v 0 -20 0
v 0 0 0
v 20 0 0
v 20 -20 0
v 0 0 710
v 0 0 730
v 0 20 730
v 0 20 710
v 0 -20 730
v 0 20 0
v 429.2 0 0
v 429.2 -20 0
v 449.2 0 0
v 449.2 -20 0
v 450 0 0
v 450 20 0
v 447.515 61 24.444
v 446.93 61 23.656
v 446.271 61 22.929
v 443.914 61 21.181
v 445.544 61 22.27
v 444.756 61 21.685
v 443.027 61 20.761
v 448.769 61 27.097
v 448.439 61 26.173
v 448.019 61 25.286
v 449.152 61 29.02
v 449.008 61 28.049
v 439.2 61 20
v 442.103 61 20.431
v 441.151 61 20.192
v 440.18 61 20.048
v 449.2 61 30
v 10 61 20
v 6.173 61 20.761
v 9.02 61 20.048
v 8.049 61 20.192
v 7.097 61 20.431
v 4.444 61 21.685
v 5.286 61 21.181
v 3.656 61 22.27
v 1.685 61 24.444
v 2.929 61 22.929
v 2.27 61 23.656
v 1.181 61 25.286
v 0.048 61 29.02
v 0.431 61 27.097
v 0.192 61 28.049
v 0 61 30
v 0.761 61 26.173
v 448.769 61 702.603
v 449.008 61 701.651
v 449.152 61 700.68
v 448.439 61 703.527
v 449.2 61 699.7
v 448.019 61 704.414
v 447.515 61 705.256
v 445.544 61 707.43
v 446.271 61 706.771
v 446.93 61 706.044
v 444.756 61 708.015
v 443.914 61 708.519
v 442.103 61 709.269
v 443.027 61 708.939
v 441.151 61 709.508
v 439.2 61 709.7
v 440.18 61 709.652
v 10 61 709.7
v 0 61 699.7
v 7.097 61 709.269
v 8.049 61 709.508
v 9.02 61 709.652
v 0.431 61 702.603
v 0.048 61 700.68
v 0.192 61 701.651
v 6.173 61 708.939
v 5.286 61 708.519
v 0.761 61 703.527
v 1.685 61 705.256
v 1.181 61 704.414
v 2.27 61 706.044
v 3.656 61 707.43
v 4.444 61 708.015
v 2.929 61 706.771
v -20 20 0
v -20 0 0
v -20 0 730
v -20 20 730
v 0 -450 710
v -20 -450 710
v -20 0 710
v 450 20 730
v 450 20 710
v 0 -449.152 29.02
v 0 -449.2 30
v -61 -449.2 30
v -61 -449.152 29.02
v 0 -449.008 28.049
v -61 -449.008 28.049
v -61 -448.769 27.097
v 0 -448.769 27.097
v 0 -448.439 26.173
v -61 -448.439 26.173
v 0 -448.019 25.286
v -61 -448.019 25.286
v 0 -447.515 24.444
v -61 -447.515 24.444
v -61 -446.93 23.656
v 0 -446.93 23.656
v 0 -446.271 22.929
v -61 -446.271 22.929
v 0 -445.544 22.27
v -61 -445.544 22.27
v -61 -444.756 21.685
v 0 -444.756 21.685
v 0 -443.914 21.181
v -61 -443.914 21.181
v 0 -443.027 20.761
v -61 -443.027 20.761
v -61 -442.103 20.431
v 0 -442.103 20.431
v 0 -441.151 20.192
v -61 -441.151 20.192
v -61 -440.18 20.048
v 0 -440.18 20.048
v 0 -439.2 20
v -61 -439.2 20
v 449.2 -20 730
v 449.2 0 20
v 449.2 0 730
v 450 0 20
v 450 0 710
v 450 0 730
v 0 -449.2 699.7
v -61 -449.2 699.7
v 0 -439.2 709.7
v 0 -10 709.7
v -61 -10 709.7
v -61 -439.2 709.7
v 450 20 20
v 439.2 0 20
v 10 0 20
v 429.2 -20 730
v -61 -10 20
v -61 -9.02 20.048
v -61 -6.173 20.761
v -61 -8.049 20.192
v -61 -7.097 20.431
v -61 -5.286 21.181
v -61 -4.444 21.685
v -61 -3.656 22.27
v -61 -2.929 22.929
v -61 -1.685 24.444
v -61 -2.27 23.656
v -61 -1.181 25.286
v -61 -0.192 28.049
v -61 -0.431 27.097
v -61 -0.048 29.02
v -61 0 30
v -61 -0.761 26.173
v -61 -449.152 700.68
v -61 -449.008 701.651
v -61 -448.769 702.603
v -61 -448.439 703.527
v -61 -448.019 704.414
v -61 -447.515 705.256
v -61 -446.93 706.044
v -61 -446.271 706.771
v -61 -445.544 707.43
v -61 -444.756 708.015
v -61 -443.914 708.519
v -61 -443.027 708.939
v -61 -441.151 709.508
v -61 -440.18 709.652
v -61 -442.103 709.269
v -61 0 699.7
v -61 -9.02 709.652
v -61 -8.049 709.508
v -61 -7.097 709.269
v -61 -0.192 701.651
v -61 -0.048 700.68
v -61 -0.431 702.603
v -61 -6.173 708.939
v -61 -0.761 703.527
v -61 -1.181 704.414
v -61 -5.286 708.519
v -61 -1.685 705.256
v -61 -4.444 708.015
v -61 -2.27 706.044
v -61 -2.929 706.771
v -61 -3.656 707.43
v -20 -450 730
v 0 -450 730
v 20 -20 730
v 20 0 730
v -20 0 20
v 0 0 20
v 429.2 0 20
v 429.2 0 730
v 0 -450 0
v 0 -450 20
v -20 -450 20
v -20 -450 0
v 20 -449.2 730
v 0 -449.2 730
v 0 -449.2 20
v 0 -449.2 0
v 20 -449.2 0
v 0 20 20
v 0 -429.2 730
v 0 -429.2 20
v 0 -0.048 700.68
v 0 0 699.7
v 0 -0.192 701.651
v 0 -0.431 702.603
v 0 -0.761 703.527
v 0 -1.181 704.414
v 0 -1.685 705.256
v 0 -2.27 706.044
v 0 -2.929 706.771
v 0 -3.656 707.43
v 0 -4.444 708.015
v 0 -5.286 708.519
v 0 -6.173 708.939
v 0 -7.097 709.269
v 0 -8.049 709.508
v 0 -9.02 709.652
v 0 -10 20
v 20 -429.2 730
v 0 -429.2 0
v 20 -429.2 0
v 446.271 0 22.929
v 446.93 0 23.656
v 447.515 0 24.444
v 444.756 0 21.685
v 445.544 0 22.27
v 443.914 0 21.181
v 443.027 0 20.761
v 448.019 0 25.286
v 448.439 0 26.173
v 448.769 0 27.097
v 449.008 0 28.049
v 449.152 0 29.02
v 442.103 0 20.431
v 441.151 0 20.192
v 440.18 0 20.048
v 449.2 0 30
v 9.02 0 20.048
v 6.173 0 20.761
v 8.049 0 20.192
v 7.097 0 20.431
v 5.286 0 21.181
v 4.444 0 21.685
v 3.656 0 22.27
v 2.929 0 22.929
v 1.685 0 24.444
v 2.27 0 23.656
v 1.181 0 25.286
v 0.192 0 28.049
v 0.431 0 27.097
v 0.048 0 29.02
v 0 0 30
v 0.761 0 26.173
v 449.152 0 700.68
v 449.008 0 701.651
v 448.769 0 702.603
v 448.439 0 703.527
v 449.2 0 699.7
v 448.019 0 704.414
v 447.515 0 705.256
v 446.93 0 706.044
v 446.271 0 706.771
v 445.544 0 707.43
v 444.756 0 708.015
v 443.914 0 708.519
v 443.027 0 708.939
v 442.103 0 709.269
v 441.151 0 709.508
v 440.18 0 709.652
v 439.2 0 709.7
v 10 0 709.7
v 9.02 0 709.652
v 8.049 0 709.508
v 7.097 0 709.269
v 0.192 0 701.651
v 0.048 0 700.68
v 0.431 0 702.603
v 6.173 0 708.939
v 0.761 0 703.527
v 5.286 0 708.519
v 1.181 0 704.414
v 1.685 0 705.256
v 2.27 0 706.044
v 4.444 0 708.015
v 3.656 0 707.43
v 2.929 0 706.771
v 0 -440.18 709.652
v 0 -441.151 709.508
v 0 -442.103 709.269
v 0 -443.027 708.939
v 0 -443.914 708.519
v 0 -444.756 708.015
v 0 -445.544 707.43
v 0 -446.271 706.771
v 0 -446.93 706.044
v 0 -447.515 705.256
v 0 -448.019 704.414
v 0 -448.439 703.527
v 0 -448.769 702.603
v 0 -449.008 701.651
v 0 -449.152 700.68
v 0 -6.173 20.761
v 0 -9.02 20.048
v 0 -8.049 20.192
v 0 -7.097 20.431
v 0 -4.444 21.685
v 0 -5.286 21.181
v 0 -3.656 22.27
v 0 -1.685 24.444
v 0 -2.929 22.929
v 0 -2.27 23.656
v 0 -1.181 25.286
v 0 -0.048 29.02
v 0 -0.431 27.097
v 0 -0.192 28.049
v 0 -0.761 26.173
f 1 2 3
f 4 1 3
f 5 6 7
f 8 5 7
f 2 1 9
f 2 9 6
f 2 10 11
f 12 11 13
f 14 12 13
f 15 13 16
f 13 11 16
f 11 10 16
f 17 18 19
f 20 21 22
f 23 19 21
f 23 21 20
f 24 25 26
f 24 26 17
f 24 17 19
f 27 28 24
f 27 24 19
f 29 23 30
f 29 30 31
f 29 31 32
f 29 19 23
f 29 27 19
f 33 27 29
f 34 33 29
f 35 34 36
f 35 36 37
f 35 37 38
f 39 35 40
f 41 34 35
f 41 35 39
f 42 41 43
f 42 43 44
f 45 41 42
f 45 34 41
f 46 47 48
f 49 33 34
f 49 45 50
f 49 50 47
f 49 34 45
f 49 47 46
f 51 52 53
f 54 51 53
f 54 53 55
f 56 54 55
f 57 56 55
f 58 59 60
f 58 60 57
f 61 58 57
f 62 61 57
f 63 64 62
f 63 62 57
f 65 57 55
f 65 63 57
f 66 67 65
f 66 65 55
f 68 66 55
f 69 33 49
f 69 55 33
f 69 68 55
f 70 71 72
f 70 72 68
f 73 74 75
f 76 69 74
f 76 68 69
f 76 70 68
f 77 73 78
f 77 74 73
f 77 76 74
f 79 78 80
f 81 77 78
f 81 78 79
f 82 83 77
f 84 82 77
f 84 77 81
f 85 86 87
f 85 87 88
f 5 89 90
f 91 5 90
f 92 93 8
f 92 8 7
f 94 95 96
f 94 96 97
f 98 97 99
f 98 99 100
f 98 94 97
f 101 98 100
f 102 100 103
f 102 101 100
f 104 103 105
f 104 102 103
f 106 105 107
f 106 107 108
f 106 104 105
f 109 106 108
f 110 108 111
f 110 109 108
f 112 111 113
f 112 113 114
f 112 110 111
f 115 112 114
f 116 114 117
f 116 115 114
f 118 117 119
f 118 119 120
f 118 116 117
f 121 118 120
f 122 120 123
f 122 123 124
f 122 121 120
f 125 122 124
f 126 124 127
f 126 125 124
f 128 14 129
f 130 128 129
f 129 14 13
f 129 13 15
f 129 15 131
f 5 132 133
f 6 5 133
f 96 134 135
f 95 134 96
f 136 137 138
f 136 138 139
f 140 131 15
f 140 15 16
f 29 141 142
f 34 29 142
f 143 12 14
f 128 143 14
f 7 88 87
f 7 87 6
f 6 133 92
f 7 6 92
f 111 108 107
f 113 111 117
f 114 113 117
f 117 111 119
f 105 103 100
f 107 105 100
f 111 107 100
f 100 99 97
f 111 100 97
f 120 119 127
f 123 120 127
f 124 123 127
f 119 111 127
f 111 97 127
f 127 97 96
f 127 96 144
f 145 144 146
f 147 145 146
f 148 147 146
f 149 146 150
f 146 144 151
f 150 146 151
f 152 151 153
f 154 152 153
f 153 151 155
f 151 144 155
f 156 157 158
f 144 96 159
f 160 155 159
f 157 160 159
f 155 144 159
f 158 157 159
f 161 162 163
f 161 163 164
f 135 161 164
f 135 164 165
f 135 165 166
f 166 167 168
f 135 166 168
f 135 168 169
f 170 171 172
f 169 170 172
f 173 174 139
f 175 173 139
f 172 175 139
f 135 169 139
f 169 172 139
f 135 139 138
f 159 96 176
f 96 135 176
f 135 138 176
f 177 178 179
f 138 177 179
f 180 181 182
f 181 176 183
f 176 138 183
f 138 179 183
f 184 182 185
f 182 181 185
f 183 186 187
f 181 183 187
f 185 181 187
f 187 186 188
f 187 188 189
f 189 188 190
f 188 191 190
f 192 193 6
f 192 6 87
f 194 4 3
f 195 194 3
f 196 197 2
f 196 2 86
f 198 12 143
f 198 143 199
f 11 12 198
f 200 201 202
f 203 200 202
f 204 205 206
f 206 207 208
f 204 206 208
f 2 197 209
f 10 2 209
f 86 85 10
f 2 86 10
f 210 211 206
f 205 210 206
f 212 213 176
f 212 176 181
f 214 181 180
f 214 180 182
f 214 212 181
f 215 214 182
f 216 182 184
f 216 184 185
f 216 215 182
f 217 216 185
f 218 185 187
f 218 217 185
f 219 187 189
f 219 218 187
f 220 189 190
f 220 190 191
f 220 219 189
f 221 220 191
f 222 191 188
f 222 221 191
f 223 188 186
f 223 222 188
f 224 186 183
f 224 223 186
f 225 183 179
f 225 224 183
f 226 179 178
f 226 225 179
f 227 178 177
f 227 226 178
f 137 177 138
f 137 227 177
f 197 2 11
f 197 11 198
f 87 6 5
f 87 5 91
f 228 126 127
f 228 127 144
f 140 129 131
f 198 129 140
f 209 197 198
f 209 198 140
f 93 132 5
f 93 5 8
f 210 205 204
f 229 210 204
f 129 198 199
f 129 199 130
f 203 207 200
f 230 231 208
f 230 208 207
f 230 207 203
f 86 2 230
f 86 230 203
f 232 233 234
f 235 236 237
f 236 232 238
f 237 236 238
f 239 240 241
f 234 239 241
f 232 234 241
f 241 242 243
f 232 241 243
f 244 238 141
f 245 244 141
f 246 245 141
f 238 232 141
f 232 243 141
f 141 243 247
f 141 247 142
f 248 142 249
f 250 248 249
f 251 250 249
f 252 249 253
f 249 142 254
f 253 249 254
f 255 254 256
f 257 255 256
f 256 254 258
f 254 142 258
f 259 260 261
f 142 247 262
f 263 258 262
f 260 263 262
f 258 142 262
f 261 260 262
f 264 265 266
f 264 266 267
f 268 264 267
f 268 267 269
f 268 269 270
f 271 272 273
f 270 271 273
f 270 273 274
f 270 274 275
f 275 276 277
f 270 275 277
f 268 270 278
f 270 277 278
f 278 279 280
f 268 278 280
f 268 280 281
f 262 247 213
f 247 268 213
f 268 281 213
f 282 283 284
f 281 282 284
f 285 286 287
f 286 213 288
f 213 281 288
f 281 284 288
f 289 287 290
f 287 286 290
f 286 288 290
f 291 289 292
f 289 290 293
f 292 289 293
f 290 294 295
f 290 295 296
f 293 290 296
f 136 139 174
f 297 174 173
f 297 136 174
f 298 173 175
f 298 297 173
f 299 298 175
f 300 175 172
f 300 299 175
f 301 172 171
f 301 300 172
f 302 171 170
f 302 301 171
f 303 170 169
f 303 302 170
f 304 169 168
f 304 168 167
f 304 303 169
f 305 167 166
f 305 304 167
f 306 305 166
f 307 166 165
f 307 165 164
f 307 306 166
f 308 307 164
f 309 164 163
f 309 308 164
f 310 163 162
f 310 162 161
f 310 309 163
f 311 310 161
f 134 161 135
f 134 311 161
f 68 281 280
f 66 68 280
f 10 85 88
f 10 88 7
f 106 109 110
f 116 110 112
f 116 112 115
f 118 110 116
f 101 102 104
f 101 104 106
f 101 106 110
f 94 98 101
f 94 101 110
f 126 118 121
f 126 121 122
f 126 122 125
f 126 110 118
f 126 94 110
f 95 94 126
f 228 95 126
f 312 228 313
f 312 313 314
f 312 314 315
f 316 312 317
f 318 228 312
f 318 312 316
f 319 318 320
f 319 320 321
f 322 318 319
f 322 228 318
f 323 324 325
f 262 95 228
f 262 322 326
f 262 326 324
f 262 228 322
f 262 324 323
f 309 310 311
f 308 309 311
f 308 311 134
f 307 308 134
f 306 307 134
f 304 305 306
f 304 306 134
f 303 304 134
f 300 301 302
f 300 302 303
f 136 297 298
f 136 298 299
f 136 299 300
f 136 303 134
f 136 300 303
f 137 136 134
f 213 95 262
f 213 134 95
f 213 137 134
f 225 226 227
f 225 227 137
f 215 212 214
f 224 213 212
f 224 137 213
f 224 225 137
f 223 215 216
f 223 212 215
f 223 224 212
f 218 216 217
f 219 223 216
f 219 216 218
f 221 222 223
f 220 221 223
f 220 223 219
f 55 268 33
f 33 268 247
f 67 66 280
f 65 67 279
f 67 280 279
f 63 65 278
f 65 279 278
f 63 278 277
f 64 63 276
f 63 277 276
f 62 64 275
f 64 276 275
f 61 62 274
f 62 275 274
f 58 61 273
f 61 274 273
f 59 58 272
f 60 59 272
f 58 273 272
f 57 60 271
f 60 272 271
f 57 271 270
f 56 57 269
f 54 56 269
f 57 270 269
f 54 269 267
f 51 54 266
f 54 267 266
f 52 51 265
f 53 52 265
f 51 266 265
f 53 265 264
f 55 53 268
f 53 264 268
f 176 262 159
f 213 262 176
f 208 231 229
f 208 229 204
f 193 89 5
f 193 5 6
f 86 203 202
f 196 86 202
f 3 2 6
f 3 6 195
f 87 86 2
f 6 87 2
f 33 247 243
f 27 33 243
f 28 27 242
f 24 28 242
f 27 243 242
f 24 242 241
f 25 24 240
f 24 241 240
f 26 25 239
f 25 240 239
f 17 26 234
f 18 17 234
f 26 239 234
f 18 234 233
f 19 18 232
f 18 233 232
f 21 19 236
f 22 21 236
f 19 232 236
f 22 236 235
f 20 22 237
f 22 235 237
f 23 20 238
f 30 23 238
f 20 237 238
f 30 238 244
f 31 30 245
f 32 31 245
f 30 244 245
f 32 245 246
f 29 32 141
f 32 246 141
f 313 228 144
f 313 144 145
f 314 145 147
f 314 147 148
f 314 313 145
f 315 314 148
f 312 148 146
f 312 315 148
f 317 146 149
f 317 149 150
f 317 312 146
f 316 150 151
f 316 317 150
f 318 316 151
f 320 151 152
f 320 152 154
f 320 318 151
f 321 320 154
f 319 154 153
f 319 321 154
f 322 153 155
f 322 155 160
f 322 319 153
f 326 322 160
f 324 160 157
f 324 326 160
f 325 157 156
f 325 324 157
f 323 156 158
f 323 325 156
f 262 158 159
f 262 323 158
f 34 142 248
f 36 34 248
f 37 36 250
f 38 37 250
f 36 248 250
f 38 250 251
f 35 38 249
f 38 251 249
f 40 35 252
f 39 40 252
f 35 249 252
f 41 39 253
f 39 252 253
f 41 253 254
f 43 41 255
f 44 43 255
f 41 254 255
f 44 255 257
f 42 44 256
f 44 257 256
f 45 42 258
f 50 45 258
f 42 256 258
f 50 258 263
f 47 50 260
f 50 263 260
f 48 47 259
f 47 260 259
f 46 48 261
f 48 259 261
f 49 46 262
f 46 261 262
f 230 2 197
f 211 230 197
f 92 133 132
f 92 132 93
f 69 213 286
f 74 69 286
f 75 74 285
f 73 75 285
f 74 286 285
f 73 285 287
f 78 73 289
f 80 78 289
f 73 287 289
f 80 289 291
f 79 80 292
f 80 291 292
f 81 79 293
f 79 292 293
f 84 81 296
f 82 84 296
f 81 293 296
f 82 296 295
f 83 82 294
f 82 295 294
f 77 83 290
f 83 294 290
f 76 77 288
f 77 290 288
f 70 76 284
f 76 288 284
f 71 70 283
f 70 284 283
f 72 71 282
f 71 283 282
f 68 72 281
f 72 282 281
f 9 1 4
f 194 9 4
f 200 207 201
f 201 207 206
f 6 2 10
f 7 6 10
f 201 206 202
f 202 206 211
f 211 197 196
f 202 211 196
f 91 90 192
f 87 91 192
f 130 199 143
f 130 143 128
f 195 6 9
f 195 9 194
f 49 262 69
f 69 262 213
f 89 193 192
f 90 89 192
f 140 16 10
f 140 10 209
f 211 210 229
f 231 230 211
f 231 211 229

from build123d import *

# Parameters (mm, degrees)
F0_W      = 20
F0_H      = 20
F3_DEPTH  = 730
F4_DEPTH  = 730
F5_W      = 20
F5_H      = 20
F6_DEPTH  = 450
F8_DEPTH  = 61
F9_W      = 20
F9_H      = 20
F10_DEPTH = 730
F11_W     = 20
F11_H     = 20
F12_DEPTH = 450


# Not quite as in the source:
# - a feature of the source that left no trace in its solid (it failed there, or was rolled back) is left out
# - a pattern or mirror of a feature is missing from the dataset's text; its kind, count and spacing are read off the source's solid


with BuildPart() as f3:
    # F0 (on Top) → F3 (new body)
    with BuildSketch(Plane.XY):
        with Locations((-10, 10)):
            Rectangle(F0_W, F0_H)
    extrude(amount=F3_DEPTH)


with BuildPart() as f4:
    # F0 (on Top) → F4 (new body)
    with BuildSketch(Plane.XY):
        with Locations((10, -10)):
            Rectangle(F0_W, F0_H)
    extrude(amount=F4_DEPTH)


with BuildPart() as f4_copies_1:
    # F4_copies: instance of F4
    add(f4.part.mirror(Plane(origin=(0, -224.6, 0), x_dir=(0, 0, -1), z_dir=(0, -1, 0))))

    # F6_copies: F6 across plane


with BuildPart() as f6:
    # F5 (on face) → F6 (new body)
    with BuildSketch(Plane.YZ):
        with Locations((10, 10)):
            Rectangle(F5_W, F5_H)
    extrude(amount=F6_DEPTH)


with BuildPart() as f4_copies_1_1:
    add(f4_copies_1.part)
    add(f6.part.mirror(Plane(origin=(0, 0, 0), x_dir=(0.7071067812, -0.7071067812, 0), z_dir=(-0.7071067812, -0.7071067812, 0))))


with BuildPart() as f8:
    # F7 (on face) → F8 (new body)
    with BuildSketch(Plane(origin=(0, 0, 0), x_dir=(-1, 0, 0), z_dir=(0, 1, 0))):
        with BuildLine():
            Line((-439.2, 20), (-10, 20))
            ThreePointArc((-10, 20), (-2.9289321881, 22.9289321881), (0, 30))
            Line((0, 30), (0, 699.7))
            ThreePointArc((0, 699.7), (-2.9289321881, 706.7710678119), (-10, 709.7))
            Line((-10, 709.7), (-439.2, 709.7))
            ThreePointArc((-439.2, 709.7), (-446.2710678119, 706.7710678119), (-449.2, 699.7))
            Line((-449.2, 699.7), (-449.2, 30))
            ThreePointArc((-449.2, 30), (-446.2710678119, 22.9289321881), (-439.2, 20))
        make_face()
    extrude(amount=F8_DEPTH)


with BuildPart() as f8_copies_1:
    # F8_copies: instance of F8
    add(f8.part.mirror(Plane(origin=(0, 0, 0), x_dir=(-0.7071067812, 0.7071067812, 0), z_dir=(-0.7071067812, -0.7071067812, 0))))


with BuildPart() as f6_1:
    add(f6.part)

    # F9 (on Top) → F10 (join)
    with BuildSketch(Plane.XY):
        with Locations((439.2, -10)):
            Rectangle(F9_W, F9_H)
    extrude(amount=F10_DEPTH)


with BuildPart() as f12:
    # F11 (on face) → F12 (new body)
    with BuildSketch(Plane.YZ):
        with Locations((10, 720)):
            Rectangle(F11_W, F11_H)
    extrude(amount=F12_DEPTH)


with BuildPart() as f12_copies_1:
    # F12_copies: instance of F12
    add(f12.part.mirror(Plane(origin=(0, 0, 0), x_dir=(-0.7071067812, 0.7071067812, 0), z_dir=(-0.7071067812, -0.7071067812, 0))))


solid = Compound([f3.part, f4.part, f4_copies_1_1.part, f8.part, f8_copies_1.part, f6_1.part, f12.part, f12_copies_1.part])
